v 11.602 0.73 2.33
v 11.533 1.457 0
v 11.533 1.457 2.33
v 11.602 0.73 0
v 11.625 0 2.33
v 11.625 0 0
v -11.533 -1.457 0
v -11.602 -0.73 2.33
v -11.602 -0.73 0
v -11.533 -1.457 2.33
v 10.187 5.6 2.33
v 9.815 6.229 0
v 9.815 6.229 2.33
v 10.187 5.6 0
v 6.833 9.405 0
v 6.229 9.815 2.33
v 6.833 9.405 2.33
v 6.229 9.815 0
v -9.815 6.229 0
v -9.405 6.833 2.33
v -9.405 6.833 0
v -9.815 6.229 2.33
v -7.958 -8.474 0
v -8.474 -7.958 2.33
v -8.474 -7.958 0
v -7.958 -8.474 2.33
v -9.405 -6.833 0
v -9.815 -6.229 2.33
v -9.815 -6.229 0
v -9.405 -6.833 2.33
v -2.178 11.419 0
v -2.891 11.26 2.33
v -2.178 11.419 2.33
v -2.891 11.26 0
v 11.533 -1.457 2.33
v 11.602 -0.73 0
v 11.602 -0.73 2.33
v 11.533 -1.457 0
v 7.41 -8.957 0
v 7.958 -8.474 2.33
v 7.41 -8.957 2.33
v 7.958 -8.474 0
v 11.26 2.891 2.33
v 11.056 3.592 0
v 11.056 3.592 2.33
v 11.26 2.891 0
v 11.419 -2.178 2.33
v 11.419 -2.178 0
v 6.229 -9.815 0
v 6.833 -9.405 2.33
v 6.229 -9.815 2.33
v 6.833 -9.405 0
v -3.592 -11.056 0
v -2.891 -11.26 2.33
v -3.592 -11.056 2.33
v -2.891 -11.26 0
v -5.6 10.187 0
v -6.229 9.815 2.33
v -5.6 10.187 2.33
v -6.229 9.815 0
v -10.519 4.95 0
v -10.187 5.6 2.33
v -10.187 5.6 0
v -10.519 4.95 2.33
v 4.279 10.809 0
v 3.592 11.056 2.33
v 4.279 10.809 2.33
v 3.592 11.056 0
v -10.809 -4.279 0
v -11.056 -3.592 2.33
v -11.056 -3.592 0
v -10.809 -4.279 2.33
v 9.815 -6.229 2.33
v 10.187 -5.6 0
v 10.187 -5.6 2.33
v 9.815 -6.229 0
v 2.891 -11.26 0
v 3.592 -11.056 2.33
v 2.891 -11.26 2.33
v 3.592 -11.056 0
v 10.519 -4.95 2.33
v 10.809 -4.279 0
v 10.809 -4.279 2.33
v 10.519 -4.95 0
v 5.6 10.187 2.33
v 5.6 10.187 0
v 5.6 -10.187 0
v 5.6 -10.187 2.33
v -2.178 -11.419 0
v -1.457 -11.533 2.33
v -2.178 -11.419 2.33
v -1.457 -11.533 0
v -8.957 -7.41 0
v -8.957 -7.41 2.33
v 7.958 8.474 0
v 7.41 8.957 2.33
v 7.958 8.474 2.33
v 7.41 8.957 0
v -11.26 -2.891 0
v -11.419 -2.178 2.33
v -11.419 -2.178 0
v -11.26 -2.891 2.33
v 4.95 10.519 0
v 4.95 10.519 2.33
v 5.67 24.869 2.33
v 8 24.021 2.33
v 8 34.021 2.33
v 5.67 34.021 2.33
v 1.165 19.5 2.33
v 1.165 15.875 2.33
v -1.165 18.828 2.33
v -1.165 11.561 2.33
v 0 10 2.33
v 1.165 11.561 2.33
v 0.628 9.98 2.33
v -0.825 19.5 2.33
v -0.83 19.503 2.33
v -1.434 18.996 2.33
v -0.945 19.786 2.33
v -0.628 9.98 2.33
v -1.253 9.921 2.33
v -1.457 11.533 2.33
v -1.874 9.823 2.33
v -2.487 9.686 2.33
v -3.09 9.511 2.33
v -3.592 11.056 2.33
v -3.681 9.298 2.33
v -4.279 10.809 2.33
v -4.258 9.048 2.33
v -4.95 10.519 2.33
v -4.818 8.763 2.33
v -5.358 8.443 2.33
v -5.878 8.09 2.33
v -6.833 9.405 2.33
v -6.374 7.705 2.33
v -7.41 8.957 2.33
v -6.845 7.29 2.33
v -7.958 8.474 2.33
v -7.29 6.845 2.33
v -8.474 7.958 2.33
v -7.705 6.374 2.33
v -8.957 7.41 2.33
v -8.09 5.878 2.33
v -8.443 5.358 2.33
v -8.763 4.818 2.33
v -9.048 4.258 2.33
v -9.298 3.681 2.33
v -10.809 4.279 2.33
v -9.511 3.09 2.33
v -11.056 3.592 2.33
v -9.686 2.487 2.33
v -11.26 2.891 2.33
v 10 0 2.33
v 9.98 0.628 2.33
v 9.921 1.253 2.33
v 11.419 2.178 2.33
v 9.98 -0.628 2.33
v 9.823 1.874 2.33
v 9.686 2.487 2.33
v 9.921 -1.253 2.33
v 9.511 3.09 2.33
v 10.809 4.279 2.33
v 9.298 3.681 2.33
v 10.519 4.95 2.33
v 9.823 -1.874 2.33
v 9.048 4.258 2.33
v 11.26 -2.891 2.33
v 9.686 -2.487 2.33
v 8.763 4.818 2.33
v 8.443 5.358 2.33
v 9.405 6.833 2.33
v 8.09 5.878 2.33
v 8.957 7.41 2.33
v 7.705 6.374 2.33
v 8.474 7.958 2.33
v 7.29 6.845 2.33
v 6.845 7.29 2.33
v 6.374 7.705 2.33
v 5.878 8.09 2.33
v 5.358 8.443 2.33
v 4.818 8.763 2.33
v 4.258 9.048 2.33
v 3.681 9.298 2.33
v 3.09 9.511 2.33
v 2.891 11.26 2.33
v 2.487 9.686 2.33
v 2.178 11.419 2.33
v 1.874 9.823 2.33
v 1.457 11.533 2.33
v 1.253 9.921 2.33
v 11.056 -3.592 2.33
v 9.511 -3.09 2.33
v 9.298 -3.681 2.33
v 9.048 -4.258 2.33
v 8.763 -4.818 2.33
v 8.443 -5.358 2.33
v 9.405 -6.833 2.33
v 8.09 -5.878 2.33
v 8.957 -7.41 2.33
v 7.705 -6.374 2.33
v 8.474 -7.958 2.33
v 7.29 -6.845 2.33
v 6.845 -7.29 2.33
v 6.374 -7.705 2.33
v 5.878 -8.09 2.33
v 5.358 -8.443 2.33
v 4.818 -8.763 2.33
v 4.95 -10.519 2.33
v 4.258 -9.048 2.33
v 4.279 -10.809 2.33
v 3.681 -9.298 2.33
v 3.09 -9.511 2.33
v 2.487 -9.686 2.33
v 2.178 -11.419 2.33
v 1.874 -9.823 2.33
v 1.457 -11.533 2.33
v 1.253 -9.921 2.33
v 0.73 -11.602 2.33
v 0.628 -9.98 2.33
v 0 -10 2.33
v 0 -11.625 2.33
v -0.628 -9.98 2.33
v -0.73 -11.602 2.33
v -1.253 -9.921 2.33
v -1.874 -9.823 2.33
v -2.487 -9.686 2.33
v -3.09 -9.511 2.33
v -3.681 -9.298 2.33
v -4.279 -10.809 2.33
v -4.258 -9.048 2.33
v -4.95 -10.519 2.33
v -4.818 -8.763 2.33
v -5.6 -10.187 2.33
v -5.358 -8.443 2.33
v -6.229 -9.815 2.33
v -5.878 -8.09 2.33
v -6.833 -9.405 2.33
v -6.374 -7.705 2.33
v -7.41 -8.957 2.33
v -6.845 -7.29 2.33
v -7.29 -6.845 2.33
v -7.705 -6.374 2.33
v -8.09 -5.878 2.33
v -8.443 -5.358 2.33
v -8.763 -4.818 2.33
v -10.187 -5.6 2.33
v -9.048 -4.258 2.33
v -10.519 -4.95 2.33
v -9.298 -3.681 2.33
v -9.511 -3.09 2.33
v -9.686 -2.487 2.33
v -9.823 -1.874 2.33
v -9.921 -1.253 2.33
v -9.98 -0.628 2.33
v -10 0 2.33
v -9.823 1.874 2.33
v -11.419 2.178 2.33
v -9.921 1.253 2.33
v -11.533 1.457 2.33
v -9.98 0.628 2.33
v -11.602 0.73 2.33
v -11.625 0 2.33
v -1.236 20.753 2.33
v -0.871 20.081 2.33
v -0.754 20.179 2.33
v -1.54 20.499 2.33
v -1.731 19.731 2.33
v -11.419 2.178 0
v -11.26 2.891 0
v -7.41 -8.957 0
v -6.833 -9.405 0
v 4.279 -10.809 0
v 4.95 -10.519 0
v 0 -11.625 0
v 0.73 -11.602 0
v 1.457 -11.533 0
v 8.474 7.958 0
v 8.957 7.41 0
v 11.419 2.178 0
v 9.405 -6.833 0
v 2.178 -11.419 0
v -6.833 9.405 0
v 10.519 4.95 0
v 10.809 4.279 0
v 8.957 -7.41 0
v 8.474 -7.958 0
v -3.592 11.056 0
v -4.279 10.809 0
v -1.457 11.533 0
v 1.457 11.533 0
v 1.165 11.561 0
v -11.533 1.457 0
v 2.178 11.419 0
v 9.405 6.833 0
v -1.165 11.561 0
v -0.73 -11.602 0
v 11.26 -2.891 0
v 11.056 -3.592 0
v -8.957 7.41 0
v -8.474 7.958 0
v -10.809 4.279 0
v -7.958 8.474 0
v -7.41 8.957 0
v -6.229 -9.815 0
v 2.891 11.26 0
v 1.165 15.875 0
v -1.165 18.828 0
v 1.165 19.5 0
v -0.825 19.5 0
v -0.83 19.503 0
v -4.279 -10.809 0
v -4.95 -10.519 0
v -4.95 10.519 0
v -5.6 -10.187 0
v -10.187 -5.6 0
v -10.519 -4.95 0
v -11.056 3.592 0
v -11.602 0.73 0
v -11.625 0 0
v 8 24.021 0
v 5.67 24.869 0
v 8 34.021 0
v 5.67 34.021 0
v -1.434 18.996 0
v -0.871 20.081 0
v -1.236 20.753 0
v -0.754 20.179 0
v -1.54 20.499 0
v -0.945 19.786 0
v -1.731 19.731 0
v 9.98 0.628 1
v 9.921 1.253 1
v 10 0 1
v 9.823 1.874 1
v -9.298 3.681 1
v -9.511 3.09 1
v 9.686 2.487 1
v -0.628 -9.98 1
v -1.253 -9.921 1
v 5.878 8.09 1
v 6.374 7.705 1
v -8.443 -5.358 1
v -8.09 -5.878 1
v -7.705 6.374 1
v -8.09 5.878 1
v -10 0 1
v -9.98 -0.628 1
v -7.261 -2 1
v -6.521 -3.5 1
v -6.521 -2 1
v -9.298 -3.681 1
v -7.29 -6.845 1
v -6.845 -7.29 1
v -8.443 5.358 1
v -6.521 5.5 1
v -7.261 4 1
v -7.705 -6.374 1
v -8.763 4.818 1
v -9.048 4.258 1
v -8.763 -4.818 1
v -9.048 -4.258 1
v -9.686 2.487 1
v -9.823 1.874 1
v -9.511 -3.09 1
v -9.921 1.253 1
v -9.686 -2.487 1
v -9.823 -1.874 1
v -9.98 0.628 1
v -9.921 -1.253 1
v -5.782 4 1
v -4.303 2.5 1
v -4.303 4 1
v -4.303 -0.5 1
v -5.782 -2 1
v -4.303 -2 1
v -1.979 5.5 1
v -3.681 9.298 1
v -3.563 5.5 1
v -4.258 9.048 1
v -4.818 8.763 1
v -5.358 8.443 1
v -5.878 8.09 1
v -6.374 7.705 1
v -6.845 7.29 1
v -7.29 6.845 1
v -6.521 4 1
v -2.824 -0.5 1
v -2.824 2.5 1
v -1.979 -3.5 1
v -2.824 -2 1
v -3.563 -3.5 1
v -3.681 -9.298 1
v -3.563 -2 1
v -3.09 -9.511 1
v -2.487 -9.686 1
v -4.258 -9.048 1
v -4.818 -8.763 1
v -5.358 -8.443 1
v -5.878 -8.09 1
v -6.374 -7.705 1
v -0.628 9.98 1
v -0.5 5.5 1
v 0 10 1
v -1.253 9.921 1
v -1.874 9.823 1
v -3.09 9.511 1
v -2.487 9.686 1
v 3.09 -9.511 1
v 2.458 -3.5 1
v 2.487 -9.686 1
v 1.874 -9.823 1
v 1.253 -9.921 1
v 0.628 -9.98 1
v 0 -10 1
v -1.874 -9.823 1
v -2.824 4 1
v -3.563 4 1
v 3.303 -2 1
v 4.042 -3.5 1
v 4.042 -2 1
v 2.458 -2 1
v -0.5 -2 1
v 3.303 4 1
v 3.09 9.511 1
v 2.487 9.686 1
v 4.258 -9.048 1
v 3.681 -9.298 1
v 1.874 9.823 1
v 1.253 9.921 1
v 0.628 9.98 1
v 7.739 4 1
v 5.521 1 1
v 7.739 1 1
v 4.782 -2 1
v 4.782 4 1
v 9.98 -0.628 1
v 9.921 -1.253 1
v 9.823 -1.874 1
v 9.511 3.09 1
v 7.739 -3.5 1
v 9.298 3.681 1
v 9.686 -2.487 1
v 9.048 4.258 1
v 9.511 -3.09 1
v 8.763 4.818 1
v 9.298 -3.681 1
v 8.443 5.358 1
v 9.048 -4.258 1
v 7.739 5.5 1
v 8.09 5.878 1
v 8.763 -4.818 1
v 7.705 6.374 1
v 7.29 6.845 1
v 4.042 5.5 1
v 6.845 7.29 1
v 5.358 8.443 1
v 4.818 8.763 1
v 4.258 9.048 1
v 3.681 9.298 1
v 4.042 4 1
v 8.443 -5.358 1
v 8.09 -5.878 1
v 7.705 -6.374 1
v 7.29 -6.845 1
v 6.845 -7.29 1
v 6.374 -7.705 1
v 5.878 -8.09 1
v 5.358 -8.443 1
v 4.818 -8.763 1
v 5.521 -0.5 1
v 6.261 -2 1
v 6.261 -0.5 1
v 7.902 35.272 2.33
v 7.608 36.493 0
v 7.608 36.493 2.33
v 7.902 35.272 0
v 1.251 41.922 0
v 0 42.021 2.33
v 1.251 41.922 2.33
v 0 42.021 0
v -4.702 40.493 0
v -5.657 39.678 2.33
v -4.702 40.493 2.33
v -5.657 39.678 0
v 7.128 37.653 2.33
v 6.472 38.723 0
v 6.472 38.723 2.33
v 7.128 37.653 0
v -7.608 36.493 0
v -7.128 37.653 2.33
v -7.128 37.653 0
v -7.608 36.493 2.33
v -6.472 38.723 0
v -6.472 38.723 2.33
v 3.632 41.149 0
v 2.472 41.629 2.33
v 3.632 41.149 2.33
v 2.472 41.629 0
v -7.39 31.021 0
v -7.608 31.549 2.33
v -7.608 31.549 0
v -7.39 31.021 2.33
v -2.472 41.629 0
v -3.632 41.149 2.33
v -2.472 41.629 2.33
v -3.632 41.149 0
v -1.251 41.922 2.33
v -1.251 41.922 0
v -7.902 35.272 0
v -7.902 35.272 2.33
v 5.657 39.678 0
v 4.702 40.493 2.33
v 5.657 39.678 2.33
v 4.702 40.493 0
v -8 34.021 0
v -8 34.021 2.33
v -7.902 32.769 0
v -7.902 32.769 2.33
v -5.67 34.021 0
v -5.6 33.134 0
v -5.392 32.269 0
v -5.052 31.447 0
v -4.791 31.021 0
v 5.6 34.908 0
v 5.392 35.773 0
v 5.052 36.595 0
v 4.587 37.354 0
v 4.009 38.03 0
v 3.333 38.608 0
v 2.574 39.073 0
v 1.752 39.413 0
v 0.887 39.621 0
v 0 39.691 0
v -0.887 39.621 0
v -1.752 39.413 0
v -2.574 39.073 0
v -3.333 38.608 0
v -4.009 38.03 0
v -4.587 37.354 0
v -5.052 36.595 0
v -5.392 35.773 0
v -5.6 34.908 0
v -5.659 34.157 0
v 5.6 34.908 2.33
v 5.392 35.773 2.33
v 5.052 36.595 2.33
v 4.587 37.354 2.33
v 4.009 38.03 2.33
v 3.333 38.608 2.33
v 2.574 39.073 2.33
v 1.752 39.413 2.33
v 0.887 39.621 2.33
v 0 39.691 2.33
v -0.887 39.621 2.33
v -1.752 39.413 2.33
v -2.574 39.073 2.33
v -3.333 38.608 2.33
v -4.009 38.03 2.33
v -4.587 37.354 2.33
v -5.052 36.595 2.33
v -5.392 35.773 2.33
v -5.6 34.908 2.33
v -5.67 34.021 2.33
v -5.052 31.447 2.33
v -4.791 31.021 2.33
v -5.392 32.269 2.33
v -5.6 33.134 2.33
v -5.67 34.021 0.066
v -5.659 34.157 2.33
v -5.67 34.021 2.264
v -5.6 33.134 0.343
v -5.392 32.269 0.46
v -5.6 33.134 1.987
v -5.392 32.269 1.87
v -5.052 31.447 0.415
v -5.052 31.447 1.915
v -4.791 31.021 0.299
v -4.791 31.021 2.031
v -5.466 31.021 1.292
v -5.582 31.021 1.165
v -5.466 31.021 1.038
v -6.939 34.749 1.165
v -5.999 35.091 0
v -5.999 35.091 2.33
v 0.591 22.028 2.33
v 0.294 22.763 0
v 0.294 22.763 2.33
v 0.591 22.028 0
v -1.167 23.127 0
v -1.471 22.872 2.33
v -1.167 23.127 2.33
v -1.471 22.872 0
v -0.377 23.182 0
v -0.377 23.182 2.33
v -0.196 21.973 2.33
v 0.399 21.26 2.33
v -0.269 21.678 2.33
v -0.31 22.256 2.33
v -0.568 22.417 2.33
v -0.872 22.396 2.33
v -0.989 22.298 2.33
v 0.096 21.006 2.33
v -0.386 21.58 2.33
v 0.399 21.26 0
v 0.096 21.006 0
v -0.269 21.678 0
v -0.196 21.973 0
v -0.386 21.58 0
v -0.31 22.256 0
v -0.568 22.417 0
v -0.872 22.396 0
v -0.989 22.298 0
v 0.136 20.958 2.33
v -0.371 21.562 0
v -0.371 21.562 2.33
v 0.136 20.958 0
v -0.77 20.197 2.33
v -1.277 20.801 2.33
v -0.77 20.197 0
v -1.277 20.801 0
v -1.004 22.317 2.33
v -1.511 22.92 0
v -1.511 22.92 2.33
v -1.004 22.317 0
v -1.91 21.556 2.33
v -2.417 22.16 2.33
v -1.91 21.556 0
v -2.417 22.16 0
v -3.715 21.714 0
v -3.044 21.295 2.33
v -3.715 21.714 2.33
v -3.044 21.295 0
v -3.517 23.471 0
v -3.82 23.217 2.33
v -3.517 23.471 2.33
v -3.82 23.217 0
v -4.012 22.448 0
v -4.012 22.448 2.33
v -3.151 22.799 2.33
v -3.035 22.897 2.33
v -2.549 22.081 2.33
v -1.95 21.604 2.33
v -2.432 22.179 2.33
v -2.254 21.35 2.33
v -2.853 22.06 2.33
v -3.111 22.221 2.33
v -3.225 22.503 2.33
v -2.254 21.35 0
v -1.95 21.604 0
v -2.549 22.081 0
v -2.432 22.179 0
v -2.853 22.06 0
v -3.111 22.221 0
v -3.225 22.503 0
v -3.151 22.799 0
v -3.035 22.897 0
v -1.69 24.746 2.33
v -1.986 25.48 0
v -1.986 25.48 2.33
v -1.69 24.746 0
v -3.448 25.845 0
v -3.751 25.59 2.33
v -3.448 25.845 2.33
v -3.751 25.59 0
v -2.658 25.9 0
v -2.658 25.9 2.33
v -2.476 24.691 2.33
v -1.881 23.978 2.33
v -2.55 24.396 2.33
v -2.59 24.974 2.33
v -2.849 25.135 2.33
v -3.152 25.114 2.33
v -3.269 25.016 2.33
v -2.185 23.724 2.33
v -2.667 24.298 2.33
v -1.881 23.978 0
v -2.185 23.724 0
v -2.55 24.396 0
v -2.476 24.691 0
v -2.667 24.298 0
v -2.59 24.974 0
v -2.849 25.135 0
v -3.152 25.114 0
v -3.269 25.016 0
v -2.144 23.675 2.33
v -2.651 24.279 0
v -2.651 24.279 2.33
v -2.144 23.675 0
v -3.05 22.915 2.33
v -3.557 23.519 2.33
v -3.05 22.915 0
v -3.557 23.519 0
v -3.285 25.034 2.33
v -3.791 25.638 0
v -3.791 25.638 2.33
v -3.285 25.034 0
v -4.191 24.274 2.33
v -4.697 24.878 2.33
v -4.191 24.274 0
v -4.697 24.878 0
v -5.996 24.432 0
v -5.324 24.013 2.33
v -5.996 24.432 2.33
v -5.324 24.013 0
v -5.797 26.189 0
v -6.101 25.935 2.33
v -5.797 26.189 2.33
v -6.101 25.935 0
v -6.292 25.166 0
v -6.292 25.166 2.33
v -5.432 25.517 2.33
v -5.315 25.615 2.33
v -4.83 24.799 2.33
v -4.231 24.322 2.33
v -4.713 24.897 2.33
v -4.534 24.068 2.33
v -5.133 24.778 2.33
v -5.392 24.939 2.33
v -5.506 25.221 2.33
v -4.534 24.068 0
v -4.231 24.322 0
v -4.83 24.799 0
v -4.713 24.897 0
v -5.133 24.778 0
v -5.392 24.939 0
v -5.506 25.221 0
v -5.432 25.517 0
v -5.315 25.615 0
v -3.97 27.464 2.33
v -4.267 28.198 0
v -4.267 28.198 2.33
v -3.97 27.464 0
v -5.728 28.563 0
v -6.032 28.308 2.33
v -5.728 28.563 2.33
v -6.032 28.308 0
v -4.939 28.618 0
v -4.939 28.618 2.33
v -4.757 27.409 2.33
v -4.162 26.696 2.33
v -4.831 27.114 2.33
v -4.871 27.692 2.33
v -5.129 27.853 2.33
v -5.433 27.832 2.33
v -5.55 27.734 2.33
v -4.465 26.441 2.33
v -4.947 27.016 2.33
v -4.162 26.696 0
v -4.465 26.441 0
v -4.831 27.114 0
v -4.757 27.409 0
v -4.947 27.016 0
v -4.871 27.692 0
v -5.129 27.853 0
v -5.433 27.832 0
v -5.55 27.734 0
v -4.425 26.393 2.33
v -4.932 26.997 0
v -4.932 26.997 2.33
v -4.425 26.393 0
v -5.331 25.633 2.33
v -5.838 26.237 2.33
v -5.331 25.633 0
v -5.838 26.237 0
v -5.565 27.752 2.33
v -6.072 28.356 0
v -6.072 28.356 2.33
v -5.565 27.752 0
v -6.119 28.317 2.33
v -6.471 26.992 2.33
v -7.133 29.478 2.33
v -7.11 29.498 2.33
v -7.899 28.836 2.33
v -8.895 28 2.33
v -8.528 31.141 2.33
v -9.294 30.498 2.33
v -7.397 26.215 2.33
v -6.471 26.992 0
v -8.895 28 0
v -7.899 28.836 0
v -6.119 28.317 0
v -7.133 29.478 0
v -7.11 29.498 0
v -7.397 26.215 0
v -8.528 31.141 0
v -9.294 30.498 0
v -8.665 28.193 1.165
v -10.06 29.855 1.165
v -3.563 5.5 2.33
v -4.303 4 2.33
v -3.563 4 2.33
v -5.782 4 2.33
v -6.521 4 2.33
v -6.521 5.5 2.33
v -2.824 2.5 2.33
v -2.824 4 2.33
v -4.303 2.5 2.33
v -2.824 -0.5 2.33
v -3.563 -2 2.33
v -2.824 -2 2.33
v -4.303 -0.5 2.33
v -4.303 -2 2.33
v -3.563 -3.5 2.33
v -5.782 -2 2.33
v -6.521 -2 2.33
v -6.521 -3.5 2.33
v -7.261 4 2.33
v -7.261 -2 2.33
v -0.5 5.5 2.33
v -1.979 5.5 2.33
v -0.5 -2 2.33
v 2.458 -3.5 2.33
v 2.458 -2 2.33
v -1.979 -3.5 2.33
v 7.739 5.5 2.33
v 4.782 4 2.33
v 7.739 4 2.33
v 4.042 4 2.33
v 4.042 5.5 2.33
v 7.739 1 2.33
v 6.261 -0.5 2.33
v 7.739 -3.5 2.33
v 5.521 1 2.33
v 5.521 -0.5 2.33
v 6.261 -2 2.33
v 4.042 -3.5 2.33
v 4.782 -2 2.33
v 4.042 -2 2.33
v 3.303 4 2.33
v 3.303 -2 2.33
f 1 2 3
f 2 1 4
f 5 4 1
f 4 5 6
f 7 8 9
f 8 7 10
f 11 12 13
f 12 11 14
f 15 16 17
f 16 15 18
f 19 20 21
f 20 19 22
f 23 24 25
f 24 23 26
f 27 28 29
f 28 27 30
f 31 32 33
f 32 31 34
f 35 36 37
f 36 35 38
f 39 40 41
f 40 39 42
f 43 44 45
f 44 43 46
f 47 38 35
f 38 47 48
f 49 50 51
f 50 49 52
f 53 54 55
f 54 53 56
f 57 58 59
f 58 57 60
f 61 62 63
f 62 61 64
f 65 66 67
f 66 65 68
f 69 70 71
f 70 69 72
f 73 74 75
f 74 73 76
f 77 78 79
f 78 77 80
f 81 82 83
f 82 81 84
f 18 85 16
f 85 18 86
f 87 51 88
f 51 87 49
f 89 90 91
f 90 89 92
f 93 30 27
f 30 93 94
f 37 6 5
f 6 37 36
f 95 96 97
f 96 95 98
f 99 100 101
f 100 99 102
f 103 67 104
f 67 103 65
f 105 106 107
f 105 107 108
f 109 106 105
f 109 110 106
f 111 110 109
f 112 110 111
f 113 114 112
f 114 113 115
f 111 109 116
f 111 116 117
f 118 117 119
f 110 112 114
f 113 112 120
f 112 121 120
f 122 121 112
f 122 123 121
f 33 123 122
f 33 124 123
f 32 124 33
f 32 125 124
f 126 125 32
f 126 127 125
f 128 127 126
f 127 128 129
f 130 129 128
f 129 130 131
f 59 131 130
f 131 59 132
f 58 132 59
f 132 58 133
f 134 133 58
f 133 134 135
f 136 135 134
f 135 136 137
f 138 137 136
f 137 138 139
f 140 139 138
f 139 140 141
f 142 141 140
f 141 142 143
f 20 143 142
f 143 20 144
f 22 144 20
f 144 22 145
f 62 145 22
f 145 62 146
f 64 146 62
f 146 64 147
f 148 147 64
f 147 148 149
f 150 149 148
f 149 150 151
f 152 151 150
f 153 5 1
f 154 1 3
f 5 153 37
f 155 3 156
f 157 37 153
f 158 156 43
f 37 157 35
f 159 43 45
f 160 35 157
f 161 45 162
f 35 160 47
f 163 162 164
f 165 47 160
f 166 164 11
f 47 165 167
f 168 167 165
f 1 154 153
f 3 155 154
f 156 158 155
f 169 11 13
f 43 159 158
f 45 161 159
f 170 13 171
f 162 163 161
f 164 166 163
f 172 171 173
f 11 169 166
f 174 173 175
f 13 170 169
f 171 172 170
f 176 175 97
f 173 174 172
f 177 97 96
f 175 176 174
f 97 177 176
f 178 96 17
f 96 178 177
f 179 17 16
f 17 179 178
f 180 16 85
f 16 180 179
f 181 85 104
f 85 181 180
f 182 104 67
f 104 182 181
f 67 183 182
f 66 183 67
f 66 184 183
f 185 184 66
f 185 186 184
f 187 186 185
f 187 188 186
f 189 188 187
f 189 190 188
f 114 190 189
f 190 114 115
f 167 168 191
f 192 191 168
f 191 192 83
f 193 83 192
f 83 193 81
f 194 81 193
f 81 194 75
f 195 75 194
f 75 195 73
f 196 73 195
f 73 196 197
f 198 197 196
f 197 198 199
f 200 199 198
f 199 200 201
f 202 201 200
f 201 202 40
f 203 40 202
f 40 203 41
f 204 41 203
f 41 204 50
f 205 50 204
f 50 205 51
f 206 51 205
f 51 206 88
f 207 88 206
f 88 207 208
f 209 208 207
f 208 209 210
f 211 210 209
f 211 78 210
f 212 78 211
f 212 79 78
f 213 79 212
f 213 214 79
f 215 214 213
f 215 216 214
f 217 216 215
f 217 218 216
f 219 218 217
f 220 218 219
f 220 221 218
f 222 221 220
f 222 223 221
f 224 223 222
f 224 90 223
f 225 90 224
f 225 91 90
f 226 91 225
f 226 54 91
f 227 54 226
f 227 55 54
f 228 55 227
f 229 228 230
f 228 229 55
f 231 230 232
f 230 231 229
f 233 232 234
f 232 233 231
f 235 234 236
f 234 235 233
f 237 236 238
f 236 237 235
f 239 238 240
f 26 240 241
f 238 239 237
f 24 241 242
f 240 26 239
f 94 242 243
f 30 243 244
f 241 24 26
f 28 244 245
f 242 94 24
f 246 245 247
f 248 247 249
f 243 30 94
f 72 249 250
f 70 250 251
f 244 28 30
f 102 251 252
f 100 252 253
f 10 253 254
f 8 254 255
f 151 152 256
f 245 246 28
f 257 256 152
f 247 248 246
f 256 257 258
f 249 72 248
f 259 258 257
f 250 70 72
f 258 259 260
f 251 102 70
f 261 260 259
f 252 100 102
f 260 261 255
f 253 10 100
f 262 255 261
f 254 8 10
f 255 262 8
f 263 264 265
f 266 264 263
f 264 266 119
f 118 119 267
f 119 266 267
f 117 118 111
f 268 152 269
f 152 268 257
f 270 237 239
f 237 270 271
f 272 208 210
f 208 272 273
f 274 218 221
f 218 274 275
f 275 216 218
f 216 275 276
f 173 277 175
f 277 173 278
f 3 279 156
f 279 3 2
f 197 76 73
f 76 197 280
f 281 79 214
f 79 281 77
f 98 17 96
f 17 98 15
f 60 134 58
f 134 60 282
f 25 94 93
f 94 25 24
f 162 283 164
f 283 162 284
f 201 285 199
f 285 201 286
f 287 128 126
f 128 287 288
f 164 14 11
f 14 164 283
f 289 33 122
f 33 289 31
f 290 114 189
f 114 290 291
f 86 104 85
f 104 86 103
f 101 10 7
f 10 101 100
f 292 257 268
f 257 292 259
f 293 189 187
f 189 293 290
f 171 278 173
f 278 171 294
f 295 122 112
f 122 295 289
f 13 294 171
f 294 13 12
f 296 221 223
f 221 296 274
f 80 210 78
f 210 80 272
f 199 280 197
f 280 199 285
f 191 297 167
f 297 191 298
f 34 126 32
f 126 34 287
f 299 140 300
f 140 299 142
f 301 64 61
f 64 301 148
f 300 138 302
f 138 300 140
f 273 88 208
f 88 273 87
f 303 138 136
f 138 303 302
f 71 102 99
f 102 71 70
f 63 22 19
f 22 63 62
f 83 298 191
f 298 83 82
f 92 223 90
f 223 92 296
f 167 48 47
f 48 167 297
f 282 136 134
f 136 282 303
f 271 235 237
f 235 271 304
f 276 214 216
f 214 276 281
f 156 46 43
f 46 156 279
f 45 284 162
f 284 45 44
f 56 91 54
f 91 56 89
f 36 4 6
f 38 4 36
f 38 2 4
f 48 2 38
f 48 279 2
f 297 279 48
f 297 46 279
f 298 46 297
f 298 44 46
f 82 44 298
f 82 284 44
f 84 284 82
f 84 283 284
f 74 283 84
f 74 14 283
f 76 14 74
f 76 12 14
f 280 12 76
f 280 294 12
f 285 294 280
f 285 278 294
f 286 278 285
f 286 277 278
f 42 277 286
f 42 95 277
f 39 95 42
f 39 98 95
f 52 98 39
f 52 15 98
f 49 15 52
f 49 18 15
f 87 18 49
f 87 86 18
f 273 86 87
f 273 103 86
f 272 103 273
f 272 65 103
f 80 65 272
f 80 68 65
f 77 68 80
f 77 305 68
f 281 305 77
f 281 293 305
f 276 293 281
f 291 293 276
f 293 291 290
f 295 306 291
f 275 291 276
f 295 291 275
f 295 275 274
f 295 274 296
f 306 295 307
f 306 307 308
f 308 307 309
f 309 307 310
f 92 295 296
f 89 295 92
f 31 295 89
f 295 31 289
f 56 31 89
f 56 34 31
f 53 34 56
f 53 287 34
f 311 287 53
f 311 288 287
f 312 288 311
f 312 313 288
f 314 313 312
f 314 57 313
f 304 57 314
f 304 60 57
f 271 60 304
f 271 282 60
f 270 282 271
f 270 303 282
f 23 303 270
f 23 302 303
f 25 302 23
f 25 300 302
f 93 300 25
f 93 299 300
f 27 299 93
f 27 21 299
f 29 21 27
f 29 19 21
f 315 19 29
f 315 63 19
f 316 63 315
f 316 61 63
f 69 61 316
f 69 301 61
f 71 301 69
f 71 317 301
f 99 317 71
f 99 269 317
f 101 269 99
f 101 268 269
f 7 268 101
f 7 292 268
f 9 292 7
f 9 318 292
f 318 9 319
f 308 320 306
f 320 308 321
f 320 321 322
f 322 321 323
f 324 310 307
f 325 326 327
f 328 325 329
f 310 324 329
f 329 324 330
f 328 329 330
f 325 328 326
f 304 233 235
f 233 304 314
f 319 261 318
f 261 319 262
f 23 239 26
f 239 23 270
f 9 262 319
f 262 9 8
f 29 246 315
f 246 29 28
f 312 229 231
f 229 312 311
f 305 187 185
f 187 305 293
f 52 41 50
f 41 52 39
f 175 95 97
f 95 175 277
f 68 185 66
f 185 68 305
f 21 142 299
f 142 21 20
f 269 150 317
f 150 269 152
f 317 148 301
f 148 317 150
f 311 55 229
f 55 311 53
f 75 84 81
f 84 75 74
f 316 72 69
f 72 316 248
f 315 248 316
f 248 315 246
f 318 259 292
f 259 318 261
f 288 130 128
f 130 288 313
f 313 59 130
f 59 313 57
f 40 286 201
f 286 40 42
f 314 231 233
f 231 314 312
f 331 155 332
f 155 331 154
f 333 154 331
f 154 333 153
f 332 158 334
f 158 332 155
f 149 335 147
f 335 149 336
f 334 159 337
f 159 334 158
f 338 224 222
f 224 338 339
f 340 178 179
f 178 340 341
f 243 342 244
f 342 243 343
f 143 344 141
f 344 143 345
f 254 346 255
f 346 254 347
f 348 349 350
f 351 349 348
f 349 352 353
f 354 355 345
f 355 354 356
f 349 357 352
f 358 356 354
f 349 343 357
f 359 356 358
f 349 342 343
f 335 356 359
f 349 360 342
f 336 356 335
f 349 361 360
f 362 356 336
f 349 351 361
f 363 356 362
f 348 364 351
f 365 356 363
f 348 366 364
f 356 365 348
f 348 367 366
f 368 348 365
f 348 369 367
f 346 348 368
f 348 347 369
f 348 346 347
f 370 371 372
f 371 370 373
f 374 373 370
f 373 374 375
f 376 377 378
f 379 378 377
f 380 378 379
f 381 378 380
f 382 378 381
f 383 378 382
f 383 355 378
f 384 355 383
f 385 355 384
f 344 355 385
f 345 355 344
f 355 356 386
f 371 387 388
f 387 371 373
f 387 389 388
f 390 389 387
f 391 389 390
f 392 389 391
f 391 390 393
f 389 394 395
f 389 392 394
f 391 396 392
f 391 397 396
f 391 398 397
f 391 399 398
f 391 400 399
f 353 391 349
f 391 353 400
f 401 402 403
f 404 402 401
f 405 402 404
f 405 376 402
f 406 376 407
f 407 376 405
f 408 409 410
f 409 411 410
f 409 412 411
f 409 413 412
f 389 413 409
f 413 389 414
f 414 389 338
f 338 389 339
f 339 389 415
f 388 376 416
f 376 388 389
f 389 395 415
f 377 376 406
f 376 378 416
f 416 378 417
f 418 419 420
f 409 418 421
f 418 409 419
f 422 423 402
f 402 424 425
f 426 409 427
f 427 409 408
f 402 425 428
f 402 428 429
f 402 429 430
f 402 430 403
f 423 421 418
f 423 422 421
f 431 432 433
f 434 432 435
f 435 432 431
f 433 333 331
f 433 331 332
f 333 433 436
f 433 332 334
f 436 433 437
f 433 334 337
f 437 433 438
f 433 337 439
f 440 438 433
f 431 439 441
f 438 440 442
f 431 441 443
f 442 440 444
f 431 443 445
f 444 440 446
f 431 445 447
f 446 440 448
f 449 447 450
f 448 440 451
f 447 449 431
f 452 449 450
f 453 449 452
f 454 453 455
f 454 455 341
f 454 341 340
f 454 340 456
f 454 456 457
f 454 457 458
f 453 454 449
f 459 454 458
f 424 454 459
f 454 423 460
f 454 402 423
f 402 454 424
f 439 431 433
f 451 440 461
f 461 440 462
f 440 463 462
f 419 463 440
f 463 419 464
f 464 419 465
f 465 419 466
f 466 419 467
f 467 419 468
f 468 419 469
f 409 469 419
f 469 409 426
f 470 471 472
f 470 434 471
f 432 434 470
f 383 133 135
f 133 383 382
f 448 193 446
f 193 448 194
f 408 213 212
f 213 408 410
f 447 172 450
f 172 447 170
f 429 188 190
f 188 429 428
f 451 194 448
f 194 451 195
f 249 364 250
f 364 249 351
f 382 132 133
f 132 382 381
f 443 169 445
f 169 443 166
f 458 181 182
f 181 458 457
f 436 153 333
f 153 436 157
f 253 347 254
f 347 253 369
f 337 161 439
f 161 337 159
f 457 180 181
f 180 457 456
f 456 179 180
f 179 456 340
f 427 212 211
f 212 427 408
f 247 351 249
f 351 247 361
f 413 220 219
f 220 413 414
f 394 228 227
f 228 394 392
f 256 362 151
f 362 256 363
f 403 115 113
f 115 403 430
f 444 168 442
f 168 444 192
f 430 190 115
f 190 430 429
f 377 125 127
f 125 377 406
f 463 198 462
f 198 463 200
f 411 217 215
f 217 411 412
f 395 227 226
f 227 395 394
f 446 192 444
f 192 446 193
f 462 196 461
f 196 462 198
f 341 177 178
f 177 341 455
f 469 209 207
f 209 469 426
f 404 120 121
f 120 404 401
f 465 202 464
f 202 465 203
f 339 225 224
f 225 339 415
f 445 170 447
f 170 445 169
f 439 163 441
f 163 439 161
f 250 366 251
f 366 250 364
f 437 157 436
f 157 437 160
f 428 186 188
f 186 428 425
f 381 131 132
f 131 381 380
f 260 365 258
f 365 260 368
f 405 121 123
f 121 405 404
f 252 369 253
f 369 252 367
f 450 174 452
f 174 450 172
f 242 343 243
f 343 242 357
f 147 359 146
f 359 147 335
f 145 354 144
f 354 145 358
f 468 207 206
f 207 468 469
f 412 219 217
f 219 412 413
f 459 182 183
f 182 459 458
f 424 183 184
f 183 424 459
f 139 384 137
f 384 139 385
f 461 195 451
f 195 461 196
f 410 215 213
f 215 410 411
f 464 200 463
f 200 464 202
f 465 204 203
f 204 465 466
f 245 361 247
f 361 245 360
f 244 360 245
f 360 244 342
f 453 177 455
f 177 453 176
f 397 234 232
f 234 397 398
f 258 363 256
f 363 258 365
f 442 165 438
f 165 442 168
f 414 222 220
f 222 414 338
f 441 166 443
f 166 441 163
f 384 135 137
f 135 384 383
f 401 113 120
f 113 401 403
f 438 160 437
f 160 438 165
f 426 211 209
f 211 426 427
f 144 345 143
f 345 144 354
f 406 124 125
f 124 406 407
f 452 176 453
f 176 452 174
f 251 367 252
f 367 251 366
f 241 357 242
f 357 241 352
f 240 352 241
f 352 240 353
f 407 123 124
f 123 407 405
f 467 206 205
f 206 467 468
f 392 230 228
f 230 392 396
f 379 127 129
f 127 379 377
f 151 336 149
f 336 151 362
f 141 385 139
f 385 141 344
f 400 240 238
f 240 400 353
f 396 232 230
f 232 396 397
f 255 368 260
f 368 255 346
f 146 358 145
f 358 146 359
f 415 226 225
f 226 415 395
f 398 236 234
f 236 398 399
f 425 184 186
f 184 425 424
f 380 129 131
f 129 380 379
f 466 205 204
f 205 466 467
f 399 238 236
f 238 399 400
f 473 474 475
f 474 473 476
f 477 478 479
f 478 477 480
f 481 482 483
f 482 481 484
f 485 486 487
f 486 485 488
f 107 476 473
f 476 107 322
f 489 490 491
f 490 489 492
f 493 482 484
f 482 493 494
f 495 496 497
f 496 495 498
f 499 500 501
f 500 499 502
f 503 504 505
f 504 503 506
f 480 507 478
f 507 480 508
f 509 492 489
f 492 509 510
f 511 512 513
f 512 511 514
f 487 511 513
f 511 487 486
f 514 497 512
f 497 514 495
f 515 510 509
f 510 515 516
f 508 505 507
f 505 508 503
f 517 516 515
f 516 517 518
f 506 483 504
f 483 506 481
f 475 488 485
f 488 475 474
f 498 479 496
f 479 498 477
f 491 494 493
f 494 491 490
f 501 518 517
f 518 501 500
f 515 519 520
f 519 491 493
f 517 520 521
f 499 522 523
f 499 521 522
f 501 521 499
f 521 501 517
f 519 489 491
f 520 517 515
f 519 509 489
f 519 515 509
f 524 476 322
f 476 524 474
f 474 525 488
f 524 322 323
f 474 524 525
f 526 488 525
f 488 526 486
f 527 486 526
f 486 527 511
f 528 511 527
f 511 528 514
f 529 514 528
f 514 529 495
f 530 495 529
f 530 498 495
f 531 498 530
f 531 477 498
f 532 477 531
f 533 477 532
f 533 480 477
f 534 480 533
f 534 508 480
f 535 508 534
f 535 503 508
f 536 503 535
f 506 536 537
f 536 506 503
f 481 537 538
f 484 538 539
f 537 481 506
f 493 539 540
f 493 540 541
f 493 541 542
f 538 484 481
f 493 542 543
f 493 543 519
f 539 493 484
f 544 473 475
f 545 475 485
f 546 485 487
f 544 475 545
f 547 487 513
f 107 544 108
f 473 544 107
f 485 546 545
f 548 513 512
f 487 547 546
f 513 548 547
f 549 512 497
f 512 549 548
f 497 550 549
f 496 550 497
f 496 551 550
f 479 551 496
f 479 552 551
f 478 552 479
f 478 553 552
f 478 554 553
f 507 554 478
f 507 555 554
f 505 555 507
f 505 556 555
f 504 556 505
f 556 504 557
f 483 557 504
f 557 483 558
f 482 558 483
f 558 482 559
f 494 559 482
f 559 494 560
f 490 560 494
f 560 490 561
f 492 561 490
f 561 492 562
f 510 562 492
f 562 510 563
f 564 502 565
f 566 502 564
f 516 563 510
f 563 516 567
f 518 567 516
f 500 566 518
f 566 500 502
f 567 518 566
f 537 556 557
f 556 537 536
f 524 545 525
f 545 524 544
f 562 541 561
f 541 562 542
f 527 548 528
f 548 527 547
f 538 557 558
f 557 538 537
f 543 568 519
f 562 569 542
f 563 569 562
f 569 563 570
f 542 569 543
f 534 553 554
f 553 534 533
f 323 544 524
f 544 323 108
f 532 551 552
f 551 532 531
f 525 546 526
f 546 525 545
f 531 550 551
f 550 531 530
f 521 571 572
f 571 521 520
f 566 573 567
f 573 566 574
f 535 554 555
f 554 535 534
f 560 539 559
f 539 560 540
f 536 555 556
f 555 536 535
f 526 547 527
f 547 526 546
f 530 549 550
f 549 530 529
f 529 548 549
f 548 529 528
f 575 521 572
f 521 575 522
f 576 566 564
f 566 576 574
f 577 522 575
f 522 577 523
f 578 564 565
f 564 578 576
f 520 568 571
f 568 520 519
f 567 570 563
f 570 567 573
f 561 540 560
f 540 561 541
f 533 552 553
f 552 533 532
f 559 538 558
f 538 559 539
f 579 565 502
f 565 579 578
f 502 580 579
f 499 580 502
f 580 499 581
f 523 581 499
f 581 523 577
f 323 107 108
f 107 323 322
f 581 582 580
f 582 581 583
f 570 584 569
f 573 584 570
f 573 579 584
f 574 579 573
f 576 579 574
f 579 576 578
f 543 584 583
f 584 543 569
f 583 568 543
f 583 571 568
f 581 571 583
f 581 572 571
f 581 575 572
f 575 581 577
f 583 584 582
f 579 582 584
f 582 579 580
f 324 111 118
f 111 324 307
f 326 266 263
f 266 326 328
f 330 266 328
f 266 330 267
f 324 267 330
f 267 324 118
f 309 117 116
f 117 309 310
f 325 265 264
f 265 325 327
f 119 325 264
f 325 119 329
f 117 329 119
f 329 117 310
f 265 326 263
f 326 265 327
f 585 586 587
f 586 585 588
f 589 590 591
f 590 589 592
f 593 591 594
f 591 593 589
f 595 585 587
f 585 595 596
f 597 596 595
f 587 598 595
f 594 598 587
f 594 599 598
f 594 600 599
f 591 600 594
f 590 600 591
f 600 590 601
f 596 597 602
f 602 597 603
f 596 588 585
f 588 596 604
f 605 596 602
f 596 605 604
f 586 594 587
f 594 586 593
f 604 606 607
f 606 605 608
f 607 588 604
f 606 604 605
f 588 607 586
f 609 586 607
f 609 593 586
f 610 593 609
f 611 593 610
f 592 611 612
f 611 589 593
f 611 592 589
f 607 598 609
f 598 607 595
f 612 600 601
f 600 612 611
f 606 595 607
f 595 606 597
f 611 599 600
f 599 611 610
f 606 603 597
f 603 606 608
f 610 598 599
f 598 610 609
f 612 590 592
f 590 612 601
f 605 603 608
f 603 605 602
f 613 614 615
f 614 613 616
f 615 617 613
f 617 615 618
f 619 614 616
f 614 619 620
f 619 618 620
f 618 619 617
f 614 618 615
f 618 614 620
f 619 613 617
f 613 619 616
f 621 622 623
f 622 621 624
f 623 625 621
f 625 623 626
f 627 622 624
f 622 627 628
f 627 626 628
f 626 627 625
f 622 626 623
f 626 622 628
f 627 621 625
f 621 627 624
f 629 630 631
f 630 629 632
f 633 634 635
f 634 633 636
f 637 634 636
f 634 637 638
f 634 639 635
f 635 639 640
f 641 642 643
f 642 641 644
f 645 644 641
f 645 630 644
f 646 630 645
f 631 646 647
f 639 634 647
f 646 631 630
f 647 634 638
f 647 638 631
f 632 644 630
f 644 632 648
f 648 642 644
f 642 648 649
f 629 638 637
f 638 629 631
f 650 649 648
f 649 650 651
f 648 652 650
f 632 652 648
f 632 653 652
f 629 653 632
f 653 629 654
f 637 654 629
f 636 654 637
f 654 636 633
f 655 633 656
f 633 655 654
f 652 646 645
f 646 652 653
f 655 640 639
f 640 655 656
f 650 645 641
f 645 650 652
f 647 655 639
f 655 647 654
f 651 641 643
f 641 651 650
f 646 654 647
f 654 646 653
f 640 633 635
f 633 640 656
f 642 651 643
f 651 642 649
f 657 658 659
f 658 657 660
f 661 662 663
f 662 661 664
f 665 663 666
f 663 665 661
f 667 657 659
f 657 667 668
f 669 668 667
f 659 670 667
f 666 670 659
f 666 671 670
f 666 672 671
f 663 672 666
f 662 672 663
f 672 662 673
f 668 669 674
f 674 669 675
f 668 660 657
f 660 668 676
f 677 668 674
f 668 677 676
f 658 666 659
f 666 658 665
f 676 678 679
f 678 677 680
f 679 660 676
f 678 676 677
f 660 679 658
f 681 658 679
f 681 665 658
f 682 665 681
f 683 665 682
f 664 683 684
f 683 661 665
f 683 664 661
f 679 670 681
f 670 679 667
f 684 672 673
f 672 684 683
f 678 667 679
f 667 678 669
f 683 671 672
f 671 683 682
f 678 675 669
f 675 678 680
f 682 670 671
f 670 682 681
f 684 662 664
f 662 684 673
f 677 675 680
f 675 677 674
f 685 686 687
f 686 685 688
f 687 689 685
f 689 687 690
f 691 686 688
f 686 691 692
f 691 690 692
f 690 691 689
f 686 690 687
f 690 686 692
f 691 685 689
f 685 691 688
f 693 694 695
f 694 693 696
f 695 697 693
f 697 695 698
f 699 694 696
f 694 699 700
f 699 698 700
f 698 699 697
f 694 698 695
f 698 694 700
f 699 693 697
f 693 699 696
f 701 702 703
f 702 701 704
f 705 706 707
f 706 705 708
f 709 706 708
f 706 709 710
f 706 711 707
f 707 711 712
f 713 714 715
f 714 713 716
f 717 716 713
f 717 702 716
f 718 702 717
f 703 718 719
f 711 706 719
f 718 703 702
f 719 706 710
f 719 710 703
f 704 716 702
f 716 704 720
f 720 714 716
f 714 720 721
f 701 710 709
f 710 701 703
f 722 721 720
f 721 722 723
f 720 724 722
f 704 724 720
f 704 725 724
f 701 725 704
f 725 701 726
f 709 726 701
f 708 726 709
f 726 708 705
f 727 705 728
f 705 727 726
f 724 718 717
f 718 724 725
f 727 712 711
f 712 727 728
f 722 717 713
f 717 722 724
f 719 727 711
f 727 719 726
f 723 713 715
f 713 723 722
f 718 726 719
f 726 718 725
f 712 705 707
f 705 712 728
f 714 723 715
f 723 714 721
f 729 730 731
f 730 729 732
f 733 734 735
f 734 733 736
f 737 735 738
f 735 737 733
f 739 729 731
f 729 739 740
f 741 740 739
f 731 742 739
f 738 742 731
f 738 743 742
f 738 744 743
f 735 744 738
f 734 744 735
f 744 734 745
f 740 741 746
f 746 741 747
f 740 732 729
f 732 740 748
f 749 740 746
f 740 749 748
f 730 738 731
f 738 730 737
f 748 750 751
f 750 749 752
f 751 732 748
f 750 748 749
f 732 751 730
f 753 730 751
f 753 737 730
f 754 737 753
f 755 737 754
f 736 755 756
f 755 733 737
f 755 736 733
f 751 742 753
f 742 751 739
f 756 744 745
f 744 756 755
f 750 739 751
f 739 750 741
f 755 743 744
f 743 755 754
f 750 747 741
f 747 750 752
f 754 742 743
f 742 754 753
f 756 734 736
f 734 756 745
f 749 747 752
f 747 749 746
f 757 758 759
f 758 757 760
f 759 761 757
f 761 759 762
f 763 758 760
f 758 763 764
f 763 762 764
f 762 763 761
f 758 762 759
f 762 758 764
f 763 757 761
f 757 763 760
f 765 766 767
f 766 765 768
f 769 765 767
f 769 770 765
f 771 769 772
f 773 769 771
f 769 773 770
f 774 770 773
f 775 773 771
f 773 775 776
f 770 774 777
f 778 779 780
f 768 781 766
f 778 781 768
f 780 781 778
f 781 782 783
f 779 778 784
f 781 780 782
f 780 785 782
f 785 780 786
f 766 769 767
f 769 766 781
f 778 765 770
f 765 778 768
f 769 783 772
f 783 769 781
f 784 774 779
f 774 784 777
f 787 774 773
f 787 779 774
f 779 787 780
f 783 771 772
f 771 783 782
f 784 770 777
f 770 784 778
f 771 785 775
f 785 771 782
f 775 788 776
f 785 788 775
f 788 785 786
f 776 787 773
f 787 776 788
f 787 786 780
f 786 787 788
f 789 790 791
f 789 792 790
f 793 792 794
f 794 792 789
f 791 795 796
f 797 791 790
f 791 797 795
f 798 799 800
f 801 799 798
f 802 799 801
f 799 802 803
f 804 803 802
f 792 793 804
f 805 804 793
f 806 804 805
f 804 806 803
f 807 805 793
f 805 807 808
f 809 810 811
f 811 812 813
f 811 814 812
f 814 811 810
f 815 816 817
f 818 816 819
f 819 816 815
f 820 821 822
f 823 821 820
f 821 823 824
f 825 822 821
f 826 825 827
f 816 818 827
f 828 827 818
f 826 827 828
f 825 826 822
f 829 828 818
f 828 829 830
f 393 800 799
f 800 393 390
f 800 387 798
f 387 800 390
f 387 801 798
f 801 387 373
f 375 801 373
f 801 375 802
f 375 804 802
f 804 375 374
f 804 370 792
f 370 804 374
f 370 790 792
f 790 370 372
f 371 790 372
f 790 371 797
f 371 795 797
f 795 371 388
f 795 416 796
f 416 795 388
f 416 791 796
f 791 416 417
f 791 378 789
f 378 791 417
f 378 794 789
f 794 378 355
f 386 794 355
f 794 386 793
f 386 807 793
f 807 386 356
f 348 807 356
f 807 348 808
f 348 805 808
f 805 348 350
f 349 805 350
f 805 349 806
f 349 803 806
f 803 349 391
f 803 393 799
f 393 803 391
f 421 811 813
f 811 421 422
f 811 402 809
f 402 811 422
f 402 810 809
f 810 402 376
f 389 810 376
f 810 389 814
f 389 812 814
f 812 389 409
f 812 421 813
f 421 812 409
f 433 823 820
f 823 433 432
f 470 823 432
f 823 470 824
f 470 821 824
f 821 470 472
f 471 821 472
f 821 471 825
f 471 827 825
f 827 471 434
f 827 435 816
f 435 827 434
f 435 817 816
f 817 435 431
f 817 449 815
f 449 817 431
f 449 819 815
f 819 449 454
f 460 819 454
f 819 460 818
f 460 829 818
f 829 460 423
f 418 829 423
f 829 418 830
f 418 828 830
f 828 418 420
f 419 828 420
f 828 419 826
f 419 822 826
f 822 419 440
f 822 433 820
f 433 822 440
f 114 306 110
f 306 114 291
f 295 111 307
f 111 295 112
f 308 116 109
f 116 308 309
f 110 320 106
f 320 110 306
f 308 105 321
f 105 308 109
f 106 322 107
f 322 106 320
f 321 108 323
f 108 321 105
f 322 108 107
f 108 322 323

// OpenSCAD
// Carabinier parameters

// Coin parameters
// Thickness of the coin (2.33 for 1 €)
HCOIN=2.33; // Height. Euro=2.33/11.625

// Radius of the coin (11.625 for 1€)
DCOIN=11.625;

// Internal radius, ie radius of the thinner part. Arbitrary
DICOIN=10;

// Thickness of the inside. 1mm is strong enough, and let space for visible motif. 
THCOIN=1; 


// Dimensions of carabiner. Play with to understand each one role.
L1=8; // Length of the connection between coin and carabinier

// Radius
R=8; // Radius of the carabinier's semi-circle

// Angle
A=40; // Angle of the oblique line

// Length
L2=10; // Length of another line (just modify it if you want to know which one^^)

// Number of circonvolution of the flexible part. 0 for straight flexible part (not advised)
NL=3;

// Thickness of the flexible part
TH=0.8; // Thickness of the flexible part


// Logo file. Does not work with Thingiverse customizer.
YOURLOGOFILE="propositionNewLogo.dxf";

// Scale and center the logo if needed
LOGOX=-16; // Scale and center the logo
LOGOY=-5;
LOGOW=16;

// Text part
YOURTEXT="CLG";


use <MCAD/fonts.scad>

thisFont=8bit_polyfont();
module char(c){
   t=search(c,thisFont[2],1,1);
        polygon(points=thisFont[2][t[0]][6][0],paths=thisFont[2][t[0]][6][1]);
}

module txt(word, spc, sc){
   for(i=[0:len(word)-1]) translate([i*spc, 0, 0])  scale(sc) char(word[i]);
}



// === End of parameters =================================================

// La pièce
difference(){
   cylinder(h=HCOIN, r=DCOIN, $fn=100);
   translate([0, 0, THCOIN]) cylinder(h=HCOIN, r=DICOIN, $fn=100);
}
if (!YOURTEXT || YOURTEXT=="") {
// Attempt to automatically resize logo. It will not fit exactly, but at least your logo should not be 1000 times smaller or larger than the coin. Adjust with LOGOX/Y/W
translate([LOGOX,LOGOY,1]) resize([0,0,HCOIN-THCOIN]) resize([LOGOW,0,0], auto=true) scale([0.01, 0.01, 1]) linear_extrude(HCOIN-THCOIN) import(YOURLOGOFILE); // scale+resize is strange, I know. This is to bypass a bug in OpenScad 2013.06. This bug is documented and should be removed in next release of OpenScad
}
if(YOURTEXT && YOURTEXT!=""){
   translate([-DICOIN*((len(YOURTEXT)==1)?1:0.8), -DICOIN/2, 0]) resize([DICOIN*1.5, DICOIN*0.9, HCOIN]) linear_extrude(HCOIN) txt(YOURTEXT, 1, 0.14);
}

// Première zone droite (qui part de la pièce) de longueur L1
translate([-HCOIN/2, DCOIN-0.125, 0]) cube([HCOIN, L1, HCOIN]);

// Zone droite oblique (sur la droite) avec un angle A, et devant rejoindre le x du cercle
xbgoblique = -cos(A)*HCOIN/2;
ybgoblique = DCOIN-0.125+L1-HCOIN*0.5*cos(A)/sin(A)-HCOIN*0.5*cos(A)*cos(A)/sin(A);
lbgoblique = (R+xbgoblique)/sin(A);
translate([xbgoblique, ybgoblique ,0]) rotate(a=-A,v=[0,0,1]) cube([HCOIN,lbgoblique,HCOIN]);

// 2e zone droite (sur la droite)
ybdoblique=ybgoblique-sin(A)*HCOIN;
yhdoblique=ybdoblique+cos(A)*lbgoblique;
translate([R-HCOIN,yhdoblique,0]) cube([HCOIN,L2,HCOIN]);

// Demi cercle (crochet carabinier)
translate([0, yhdoblique+L2, 0]) difference(){
   cylinder(h=HCOIN, r=R, $fn=40);
   translate([0,0,-1]) cylinder(h=HCOIN+2, r=R-HCOIN, $fn=40);
   translate([-25, -50-0.375*R, -25]) cube([50,50,50]);
	translate([0,-50,-25]) cube([50,50,50]);
	translate([-R+HCOIN+0.27,-0.375*R-0.5,0]) rotate(a=20, v=[0,0,1]) rotate(a=-90, v=[1,0,0]) linear_extrude(4.5) polygon([[0,-HCOIN/2], [1,-HCOIN], [1,0]]);
}

// Ressort : longueur qu'il doit être
hress=yhdoblique+L2-DCOIN+0.125-L1-0.375*R-4.5;
lress=sqrt(R*R+hress*hress);

// Une boucle de taille non paramétrique (on scalera)
module oneloop(){
	difference(){
	   cylinder(h=HCOIN, r=1.3, $fn=10);
		translate([0,0,-0.01]) cylinder(h=HCOIN+0.02, r=1.3-TH, $fn=10);
		translate([0, -5, -0.01]) cube([10,10,HCOIN+0.02]);
	}
}

// Deux boucles
module chain(){
	translate([-0.6, 0,0]) oneloop();
   translate([0.6, 2.6-TH, 0]) mirror() oneloop();
	translate([-0.6,1.3-TH,0]) cube([1.2, TH, HCOIN]);
	translate([-0.6,3.9-2*TH,0]) cube([1.2, TH, HCOIN]);
}
LL=5.2-2*TH;

// Une chaine de longueur n
module chaine(n){
   for(i=[0:1:n]) translate([0, LL*i,0]) chain();
}

// 3.6*NL est la longueur fixe (non paramétrique) du ressort. Il faut mettre une échelle
// pour lui donner la longueur voulue

module finress(){
	translate([-1.8,0,0]) cube([HCOIN,HCOIN,HCOIN]);
	translate([-0.5,0,0]) cube([1,4.5, HCOIN]);
	translate([-1.5,0,0]) rotate(a=-90, v=[1,0,0]) linear_extrude(4.5) polygon([[0,-HCOIN/2], [1,-HCOIN], [1,0]]);
}

translate([0, DCOIN-0.125+L1+0.7, 0]) rotate(a=40, v=[0,0,1]) scale([lress/NL/LL, lress/NL/LL, 1]) {
	chaine(NL-1);
	translate([0,NL*LL-1.3, 0]) scale([NL*LL/lress, NL*LL/lress, 1]) finress();
}
